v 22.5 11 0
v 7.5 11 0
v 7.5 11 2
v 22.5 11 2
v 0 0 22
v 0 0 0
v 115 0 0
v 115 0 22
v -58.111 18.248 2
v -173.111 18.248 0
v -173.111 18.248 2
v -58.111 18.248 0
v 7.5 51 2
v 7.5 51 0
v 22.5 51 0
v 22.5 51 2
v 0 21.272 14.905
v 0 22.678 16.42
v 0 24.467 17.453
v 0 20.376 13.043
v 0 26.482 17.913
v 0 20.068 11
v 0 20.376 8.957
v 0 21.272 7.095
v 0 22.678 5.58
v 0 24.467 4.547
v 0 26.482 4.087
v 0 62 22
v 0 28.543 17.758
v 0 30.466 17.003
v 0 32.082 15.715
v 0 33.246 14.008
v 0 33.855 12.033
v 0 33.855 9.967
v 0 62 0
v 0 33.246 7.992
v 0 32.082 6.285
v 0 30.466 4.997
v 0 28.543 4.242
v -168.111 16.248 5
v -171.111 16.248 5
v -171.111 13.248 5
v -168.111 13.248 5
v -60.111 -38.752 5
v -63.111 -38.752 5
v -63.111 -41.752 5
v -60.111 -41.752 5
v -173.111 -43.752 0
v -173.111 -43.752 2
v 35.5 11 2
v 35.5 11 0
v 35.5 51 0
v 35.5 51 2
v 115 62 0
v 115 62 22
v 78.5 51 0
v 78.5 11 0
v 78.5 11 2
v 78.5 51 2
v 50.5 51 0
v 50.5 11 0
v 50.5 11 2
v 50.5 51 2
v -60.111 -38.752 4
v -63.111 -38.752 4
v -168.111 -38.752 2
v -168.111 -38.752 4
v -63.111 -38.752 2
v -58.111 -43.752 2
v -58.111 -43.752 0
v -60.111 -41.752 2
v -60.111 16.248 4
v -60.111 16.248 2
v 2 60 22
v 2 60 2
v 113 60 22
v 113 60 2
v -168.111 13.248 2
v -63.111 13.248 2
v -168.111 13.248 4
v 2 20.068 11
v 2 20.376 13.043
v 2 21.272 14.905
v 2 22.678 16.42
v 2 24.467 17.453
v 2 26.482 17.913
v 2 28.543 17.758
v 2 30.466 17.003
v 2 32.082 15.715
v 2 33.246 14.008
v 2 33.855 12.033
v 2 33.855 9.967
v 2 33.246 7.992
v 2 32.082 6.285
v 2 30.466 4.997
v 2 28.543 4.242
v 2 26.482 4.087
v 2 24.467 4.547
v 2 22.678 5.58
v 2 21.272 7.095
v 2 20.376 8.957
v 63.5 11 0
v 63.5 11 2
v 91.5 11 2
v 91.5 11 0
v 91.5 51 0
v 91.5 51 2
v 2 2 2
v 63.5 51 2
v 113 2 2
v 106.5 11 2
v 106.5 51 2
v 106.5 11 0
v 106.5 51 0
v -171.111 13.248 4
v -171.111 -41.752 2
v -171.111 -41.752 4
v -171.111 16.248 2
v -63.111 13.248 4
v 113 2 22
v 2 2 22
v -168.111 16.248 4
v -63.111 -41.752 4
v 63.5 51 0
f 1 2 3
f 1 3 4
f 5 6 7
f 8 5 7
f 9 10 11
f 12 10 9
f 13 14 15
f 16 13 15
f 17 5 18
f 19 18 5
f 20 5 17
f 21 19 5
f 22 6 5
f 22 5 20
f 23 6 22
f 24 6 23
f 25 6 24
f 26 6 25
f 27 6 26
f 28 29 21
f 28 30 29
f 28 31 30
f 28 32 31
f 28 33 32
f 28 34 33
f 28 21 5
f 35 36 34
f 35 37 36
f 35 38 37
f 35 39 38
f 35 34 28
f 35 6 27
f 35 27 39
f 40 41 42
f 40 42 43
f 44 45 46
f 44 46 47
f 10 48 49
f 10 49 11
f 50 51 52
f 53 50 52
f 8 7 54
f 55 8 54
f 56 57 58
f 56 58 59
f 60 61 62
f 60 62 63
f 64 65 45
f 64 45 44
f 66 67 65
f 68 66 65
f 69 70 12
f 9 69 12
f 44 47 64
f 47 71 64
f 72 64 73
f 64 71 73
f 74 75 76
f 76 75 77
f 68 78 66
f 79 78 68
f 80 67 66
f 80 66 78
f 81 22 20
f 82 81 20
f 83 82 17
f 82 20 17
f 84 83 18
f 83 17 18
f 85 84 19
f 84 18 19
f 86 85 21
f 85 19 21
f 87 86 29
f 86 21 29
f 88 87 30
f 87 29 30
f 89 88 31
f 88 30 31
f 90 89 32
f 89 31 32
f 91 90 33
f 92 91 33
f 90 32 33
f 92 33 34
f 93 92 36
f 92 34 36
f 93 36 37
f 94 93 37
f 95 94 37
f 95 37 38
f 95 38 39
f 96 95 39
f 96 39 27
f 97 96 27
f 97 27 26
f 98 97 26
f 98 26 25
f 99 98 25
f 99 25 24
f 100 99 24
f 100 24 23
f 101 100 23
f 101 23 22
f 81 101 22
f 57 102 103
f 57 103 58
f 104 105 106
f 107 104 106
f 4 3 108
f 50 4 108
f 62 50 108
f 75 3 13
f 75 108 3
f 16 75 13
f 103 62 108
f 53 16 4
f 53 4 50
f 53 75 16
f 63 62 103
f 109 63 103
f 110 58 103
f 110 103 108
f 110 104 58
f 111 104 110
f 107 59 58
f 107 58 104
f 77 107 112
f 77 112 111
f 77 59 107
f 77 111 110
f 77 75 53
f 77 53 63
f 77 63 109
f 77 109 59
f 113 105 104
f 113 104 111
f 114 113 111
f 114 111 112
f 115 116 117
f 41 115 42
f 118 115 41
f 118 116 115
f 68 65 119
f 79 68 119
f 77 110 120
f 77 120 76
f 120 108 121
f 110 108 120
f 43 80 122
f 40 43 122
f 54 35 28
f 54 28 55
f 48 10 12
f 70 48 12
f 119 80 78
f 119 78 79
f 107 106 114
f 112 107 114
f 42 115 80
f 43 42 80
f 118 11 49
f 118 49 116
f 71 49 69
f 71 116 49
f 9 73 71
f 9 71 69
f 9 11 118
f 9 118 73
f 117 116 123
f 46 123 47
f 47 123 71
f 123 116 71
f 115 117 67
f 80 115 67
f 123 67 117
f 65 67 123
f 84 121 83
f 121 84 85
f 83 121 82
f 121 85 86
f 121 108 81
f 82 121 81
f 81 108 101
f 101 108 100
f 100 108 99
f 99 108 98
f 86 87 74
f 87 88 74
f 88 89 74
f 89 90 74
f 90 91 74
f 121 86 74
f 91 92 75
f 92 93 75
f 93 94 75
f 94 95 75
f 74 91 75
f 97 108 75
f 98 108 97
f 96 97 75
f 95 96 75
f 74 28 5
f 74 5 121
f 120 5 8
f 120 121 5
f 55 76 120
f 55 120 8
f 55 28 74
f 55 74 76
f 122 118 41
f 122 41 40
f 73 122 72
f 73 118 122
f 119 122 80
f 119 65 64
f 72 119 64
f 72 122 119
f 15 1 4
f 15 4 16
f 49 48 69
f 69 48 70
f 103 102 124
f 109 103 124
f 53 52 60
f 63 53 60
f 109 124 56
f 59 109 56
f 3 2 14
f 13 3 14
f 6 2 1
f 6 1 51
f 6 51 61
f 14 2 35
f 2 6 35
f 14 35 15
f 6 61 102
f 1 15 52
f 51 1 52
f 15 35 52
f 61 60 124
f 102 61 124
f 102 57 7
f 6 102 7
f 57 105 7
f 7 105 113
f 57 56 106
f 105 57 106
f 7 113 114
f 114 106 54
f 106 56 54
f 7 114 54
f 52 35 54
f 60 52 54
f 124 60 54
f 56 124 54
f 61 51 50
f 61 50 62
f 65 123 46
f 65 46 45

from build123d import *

# Parameters (mm, degrees)
F0_W      = 111
F0_H      = 58
F0_W_2    = 15
F0_H_2    = 40
F1_DEPTH  = 2
F0_W_3    = 115
F0_H_3    = 62
F2_DEPTH  = 22
F3_R      = 6.932096
F4_DEPTH  = 25
F5_W      = 115
F5_H      = 62
F5_W_2    = 111
F5_H_2    = 58
F6_DEPTH  = 2
F7_DEPTH  = 4
F8_W      = 105
F8_H      = 52
F9_DEPTH  = 2
F8_W_2    = 3
F8_H_2    = 3
F10_DEPTH = 1


with BuildPart() as f1:
    # F0 (on Top) → F1 (new body)
    with BuildSketch(Plane.XY):
        with Locations((57.5, 31)):
            Rectangle(F0_W, F0_H)
        with Locations((15, 31)):
            Rectangle(F0_W_2, F0_H_2, mode=Mode.SUBTRACT)
        with Locations((43, 31)):
            Rectangle(F0_W_2, F0_H_2, mode=Mode.SUBTRACT)
        with Locations((71, 31)):
            Rectangle(F0_W_2, F0_H_2, mode=Mode.SUBTRACT)
        with Locations((99, 31)):
            Rectangle(F0_W_2, F0_H_2, mode=Mode.SUBTRACT)
    extrude(amount=F1_DEPTH)

    # F0 (on Top) → F2 (join)
    with BuildSketch(Plane.XY):
        with Locations((57.5, 31)):
            Rectangle(F0_W_3, F0_H_3)
        with Locations((57.5, 31)):
            Rectangle(F0_W, F0_H, mode=Mode.SUBTRACT)
    extrude(amount=F2_DEPTH)

    # F3 (on face) → F4 (cut)
    with BuildSketch(Plane(origin=(0, 0, 0), x_dir=(0, -1, 0), z_dir=(-1, 0, 0))):
        with Locations((-27, 11)):
            Circle(F3_R)
    extrude(amount=-F4_DEPTH, mode=Mode.SUBTRACT)


with BuildPart() as f6:
    # F5 (on Top) → F6 (new body)
    with BuildSketch(Plane.XY):
        with Locations((-115.610846, -12.752371)):
            Rectangle(F5_W, F5_H)
        with Locations((-115.610846, -12.752371)):
            Rectangle(F5_W_2, F5_H_2, mode=Mode.SUBTRACT)
    extrude(amount=F6_DEPTH)

    # F5 (on Top) → F7 (join)
    with BuildSketch(Plane.XY):
        with Locations((-115.610846, -12.752371)):
            Rectangle(F5_W_2, F5_H_2)
    extrude(amount=F7_DEPTH)

    # F8 (on face) → F9 (cut)
    with BuildSketch(Plane.XY.offset(4)):
        with Locations((-115.610846, -12.752371)):
            Rectangle(F8_W, F8_H)
    extrude(amount=-F9_DEPTH, mode=Mode.SUBTRACT)

    # F8 (on face) → F10 (join)
    with BuildSketch(Plane.XY.offset(4)):
        with Locations((-61.610846, -40.252371)):
            Rectangle(F8_W_2, F8_H_2)
        with Locations((-169.610846, 14.747629)):
            Rectangle(F8_W_2, F8_H_2)
    extrude(amount=F10_DEPTH)


solid = Compound([f1.part, f6.part])
